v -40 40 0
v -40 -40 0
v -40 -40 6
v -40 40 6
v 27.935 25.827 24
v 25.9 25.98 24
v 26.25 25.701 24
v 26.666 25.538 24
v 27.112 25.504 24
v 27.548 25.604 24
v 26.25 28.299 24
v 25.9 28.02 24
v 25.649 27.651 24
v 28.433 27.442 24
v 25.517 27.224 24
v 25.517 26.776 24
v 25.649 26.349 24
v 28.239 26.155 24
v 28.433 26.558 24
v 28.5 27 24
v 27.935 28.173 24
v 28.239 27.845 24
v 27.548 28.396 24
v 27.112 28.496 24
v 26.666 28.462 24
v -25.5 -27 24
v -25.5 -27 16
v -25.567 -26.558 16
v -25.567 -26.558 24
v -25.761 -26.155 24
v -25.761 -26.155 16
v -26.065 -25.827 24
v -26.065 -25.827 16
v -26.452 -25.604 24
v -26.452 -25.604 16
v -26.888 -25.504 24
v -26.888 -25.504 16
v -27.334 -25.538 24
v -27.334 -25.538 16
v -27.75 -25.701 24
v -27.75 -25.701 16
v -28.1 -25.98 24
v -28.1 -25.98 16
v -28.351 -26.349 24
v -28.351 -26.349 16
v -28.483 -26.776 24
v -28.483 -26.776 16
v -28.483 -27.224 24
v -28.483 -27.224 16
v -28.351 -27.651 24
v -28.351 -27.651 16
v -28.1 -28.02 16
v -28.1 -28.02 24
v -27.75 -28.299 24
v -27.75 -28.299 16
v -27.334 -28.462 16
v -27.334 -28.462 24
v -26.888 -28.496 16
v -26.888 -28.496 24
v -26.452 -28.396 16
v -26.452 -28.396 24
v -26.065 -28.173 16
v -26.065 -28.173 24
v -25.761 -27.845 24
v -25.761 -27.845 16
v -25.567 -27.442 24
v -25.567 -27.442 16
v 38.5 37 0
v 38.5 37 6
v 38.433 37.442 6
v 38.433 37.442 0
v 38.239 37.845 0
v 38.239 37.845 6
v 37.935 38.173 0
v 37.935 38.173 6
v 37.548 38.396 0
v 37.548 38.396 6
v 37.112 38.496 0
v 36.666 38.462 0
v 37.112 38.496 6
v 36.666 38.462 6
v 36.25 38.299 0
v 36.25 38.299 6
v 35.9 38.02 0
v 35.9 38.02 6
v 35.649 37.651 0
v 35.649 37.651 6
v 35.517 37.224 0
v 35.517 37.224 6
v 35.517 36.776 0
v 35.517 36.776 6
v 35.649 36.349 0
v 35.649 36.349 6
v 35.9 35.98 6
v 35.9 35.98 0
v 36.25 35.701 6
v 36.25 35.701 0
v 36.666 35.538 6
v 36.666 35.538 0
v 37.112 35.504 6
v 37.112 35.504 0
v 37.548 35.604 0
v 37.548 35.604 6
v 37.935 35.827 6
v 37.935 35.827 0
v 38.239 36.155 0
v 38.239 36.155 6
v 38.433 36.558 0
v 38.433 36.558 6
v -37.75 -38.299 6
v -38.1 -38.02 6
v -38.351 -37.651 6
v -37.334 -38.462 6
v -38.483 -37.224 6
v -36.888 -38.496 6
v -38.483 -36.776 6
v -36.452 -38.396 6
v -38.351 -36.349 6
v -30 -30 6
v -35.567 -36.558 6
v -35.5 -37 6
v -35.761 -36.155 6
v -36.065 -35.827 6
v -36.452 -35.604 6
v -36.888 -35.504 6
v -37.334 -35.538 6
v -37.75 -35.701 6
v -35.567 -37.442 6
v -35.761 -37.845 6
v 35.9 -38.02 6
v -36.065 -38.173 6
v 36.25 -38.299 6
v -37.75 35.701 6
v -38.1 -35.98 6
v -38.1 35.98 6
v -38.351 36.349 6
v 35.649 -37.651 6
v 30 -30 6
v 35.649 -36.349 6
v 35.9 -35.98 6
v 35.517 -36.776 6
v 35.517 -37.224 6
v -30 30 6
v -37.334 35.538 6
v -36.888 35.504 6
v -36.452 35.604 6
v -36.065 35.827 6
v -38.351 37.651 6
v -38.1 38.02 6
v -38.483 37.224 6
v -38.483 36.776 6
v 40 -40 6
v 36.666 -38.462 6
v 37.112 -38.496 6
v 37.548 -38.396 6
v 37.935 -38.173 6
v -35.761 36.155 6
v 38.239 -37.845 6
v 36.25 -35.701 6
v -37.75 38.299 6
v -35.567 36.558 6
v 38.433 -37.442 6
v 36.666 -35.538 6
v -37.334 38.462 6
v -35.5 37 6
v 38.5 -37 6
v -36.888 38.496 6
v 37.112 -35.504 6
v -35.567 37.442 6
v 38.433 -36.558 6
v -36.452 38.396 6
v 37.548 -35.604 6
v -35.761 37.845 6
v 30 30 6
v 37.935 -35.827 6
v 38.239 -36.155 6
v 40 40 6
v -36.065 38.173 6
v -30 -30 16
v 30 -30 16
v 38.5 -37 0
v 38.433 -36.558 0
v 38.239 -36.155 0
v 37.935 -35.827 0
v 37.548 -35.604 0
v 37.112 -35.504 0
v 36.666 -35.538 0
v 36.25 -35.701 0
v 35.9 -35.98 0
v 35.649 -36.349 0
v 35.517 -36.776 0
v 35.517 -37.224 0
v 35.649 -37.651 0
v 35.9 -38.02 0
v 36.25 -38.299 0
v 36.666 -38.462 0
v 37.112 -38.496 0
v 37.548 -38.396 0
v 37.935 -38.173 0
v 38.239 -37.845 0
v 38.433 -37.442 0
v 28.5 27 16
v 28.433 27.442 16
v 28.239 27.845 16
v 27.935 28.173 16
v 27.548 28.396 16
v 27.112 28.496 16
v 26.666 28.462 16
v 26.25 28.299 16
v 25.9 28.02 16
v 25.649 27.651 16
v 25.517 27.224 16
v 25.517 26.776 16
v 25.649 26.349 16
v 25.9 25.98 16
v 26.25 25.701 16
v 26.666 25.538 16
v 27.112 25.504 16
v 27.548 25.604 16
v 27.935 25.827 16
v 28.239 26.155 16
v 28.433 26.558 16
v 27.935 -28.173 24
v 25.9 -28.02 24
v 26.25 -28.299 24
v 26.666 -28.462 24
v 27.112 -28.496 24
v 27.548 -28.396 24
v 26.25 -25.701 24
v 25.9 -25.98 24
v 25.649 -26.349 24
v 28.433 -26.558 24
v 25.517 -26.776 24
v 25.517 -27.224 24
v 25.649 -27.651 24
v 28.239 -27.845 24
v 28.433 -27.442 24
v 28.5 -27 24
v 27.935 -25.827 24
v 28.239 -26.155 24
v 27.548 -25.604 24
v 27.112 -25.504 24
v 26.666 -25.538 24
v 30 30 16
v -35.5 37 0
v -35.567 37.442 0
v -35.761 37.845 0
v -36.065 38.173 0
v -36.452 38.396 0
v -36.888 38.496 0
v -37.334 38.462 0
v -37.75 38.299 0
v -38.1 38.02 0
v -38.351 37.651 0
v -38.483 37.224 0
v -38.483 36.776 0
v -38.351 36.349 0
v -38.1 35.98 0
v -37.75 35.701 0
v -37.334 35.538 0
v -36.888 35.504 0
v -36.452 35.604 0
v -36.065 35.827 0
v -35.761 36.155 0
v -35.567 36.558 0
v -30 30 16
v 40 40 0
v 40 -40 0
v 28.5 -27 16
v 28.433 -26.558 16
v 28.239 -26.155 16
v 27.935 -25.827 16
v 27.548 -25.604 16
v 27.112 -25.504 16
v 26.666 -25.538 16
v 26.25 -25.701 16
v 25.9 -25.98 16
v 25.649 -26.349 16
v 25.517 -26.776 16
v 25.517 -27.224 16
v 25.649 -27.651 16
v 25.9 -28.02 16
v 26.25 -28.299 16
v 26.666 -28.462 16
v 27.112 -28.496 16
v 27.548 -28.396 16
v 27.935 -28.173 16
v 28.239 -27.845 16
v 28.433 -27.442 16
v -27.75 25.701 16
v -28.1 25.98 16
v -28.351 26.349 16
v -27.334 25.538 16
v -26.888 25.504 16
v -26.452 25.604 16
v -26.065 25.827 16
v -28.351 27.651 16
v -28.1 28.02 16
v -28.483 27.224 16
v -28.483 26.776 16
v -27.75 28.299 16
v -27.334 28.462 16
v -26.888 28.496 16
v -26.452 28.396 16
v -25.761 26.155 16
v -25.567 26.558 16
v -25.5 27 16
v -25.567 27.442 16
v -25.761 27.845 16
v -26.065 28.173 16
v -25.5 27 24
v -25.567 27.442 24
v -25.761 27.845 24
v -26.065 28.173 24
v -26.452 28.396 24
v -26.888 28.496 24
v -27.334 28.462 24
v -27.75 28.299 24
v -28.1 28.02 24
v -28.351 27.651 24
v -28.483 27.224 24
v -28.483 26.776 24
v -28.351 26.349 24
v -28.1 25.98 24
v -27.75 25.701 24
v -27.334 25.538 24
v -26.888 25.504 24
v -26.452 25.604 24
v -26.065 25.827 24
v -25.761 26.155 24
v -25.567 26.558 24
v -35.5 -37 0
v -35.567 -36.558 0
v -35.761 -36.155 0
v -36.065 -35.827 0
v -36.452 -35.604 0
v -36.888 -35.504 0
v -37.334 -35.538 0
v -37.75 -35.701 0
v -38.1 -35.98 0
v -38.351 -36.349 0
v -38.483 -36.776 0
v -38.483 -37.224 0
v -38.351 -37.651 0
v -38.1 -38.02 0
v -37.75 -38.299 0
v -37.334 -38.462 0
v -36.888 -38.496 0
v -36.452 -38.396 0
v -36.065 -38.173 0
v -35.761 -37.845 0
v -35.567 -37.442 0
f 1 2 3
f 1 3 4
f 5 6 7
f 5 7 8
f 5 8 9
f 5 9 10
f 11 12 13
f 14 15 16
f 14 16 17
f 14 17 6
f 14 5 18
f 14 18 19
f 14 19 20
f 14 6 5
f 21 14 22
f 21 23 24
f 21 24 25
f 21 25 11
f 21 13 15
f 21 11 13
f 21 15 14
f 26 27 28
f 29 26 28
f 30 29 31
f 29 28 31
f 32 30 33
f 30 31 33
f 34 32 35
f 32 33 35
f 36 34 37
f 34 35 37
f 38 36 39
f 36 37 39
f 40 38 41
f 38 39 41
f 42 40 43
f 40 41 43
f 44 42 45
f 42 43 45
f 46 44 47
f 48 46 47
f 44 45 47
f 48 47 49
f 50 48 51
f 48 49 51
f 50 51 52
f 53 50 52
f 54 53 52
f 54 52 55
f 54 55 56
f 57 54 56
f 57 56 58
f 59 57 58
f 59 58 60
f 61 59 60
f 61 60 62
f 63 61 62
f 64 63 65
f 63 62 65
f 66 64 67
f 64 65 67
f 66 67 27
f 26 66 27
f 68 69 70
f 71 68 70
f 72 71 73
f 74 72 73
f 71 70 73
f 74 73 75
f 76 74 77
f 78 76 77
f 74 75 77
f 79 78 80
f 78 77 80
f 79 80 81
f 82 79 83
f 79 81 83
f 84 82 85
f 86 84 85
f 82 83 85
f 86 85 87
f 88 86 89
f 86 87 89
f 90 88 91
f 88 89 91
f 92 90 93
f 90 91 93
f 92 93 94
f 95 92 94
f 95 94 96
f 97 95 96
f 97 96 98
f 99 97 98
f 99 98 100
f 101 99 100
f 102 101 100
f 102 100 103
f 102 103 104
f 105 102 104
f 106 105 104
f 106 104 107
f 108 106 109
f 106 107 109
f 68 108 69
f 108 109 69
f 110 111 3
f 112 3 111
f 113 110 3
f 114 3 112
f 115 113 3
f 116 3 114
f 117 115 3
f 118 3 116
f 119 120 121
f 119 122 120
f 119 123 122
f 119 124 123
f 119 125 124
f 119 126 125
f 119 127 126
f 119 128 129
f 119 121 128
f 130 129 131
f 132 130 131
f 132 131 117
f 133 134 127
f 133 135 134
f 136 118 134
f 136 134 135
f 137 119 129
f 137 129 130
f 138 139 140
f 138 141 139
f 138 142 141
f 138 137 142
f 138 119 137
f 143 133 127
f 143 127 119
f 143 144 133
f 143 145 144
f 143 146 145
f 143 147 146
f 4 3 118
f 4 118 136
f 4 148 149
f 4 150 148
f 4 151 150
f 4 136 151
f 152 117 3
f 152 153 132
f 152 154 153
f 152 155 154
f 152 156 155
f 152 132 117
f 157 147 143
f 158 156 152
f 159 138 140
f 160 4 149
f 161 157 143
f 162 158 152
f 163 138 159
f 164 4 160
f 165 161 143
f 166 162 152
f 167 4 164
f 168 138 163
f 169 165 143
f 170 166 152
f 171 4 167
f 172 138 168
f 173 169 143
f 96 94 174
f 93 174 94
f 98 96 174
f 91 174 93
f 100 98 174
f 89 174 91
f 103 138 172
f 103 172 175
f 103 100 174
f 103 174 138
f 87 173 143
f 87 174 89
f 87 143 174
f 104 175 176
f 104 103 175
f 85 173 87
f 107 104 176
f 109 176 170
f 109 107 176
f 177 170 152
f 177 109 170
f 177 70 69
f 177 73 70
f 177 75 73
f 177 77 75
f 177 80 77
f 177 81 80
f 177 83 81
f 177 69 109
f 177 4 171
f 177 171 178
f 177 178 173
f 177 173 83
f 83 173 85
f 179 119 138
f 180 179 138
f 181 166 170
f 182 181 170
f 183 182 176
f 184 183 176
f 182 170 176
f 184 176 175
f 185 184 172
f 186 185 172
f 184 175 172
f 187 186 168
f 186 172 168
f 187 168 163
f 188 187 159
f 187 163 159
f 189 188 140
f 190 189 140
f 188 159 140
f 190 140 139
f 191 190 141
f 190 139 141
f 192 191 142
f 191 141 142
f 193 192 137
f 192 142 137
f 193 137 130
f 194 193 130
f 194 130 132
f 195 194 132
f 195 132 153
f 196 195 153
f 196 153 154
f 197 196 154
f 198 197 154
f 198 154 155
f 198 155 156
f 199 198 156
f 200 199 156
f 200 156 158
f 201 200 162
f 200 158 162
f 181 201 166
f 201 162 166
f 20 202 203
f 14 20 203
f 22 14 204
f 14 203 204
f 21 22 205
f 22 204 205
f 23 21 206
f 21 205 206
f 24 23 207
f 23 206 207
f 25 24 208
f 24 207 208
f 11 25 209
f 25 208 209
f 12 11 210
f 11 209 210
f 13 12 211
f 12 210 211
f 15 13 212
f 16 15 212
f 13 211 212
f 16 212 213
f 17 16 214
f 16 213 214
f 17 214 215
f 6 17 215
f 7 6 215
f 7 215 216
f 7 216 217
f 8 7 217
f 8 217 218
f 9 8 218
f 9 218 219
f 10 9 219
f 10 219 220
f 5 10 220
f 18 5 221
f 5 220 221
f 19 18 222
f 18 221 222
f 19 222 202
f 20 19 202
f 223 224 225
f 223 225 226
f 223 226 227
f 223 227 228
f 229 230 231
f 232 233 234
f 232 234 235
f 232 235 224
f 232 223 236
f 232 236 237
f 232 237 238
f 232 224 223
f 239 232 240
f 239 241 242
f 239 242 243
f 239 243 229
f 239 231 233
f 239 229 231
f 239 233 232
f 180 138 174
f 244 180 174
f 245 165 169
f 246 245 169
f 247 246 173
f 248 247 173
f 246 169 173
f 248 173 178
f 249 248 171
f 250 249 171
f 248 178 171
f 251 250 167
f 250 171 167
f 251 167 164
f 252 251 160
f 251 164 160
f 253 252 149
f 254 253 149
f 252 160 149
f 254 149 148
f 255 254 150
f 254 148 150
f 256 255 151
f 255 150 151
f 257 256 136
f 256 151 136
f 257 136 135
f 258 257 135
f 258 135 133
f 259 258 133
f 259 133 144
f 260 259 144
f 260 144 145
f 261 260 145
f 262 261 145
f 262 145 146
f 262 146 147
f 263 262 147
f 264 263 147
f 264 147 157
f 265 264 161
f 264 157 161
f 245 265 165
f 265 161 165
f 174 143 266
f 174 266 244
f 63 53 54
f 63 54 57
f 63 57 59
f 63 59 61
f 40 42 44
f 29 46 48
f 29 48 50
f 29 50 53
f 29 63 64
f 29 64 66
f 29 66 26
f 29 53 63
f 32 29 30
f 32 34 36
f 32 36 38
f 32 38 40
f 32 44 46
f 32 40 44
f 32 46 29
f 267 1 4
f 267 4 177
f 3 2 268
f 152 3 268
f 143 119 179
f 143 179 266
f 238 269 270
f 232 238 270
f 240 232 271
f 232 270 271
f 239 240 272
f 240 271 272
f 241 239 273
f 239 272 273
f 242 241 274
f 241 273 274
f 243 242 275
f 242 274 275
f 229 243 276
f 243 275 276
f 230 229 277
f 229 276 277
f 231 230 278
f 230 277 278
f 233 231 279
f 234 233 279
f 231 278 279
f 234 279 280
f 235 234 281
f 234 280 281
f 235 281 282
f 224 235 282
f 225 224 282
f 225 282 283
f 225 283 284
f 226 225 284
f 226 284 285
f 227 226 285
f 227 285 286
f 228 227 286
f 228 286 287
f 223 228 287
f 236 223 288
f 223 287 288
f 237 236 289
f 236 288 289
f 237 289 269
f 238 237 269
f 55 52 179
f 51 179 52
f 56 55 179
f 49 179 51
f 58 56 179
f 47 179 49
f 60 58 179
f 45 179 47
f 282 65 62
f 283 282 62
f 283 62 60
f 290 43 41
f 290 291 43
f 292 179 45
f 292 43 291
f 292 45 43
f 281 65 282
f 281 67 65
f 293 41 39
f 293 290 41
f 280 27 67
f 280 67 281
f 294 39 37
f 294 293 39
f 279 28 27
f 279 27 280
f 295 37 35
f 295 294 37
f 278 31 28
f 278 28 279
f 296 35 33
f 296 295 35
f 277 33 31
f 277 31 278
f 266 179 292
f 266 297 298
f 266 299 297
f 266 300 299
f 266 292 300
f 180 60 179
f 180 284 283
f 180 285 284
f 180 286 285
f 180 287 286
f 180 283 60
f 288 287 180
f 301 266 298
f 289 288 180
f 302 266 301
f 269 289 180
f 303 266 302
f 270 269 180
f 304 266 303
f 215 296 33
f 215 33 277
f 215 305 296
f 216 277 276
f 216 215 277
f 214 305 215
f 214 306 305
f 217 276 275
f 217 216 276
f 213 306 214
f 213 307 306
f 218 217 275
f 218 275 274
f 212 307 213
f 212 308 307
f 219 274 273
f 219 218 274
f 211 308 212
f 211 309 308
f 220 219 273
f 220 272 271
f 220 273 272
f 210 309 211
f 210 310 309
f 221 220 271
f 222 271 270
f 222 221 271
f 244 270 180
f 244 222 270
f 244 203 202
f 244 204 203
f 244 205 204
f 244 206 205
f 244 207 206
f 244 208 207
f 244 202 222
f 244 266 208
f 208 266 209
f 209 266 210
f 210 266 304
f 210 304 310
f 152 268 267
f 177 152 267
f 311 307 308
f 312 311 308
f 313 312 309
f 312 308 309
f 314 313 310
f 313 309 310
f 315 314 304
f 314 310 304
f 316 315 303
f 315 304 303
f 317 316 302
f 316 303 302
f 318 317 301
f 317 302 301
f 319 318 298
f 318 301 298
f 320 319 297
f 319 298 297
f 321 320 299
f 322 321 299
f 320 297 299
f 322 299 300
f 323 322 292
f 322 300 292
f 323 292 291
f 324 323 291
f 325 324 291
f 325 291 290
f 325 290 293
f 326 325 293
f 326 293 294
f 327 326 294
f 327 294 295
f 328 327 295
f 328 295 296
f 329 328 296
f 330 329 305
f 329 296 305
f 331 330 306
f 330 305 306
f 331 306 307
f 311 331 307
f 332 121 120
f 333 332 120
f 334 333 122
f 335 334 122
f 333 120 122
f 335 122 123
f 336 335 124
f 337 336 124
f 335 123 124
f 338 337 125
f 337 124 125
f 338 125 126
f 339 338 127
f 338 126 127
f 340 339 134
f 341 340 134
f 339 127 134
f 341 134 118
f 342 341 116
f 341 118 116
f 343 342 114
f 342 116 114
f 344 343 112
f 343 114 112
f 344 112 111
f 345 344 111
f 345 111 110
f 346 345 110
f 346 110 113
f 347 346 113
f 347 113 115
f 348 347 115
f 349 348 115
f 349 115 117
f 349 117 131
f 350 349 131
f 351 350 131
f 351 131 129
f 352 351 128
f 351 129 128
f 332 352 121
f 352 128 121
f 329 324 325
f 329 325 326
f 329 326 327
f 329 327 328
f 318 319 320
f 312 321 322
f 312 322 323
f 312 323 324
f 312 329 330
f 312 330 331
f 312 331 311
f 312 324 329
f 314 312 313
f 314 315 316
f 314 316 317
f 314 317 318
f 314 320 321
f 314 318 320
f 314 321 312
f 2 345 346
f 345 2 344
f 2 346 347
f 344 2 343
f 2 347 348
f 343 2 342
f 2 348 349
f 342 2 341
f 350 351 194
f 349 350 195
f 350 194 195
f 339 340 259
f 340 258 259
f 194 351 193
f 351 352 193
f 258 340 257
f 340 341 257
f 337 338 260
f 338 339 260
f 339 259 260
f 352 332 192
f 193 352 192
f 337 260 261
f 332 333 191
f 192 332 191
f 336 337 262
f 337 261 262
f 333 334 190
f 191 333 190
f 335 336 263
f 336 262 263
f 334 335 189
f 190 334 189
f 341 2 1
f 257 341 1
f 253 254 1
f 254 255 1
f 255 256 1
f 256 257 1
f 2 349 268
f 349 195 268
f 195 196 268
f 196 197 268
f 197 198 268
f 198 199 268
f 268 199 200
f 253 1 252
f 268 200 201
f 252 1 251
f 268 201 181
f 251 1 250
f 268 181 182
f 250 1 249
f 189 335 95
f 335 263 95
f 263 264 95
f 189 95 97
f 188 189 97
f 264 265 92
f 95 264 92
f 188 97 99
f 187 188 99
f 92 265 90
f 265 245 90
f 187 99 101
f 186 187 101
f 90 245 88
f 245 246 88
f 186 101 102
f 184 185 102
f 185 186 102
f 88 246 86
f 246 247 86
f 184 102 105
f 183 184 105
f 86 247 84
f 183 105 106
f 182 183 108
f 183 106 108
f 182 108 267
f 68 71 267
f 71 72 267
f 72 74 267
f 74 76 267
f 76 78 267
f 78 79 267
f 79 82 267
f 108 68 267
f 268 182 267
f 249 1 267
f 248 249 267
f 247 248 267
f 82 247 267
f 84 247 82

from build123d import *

# Parameters (mm, degrees)
F0_W     = 80
F0_H     = 80
F1_DEPTH = 6
F2_W     = 60
F2_H     = 60
F3_DEPTH = 10
F4_R     = 1.5
F5_DEPTH = 8
F6_R     = 1.5
F7_DEPTH = 6


with BuildPart() as f1:
    # F0 (on Top) → F1 (new body)
    with BuildSketch(Plane.XY):
        Rectangle(F0_W, F0_H)
    extrude(amount=F1_DEPTH)

    # F2 (on face) → F3 (join)
    with BuildSketch(Plane.XY.offset(6)):
        Rectangle(F2_W, F2_H)
    extrude(amount=F3_DEPTH)

    # F4 (on face) → F5 (join)
    with BuildSketch(Plane.XY.offset(16)):
        with Locations((-27, -27)):
            Circle(F4_R)
        with Locations((27, -27)):
            Circle(F4_R)
        with Locations((27, 27)):
            Circle(F4_R)
        with Locations((-27, 27)):
            Circle(F4_R)
    extrude(amount=F5_DEPTH)

    # F6 (on face) → F7 (cut)
    with BuildSketch(Plane.XY.offset(6)):
        with Locations((-37, 37)):
            Circle(F6_R)
        with Locations((37, 37)):
            Circle(F6_R)
        with Locations((-37, -37)):
            Circle(F6_R)
        with Locations((37, -37)):
            Circle(F6_R)
    extrude(amount=-F7_DEPTH, mode=Mode.SUBTRACT)


solid = f1.part
